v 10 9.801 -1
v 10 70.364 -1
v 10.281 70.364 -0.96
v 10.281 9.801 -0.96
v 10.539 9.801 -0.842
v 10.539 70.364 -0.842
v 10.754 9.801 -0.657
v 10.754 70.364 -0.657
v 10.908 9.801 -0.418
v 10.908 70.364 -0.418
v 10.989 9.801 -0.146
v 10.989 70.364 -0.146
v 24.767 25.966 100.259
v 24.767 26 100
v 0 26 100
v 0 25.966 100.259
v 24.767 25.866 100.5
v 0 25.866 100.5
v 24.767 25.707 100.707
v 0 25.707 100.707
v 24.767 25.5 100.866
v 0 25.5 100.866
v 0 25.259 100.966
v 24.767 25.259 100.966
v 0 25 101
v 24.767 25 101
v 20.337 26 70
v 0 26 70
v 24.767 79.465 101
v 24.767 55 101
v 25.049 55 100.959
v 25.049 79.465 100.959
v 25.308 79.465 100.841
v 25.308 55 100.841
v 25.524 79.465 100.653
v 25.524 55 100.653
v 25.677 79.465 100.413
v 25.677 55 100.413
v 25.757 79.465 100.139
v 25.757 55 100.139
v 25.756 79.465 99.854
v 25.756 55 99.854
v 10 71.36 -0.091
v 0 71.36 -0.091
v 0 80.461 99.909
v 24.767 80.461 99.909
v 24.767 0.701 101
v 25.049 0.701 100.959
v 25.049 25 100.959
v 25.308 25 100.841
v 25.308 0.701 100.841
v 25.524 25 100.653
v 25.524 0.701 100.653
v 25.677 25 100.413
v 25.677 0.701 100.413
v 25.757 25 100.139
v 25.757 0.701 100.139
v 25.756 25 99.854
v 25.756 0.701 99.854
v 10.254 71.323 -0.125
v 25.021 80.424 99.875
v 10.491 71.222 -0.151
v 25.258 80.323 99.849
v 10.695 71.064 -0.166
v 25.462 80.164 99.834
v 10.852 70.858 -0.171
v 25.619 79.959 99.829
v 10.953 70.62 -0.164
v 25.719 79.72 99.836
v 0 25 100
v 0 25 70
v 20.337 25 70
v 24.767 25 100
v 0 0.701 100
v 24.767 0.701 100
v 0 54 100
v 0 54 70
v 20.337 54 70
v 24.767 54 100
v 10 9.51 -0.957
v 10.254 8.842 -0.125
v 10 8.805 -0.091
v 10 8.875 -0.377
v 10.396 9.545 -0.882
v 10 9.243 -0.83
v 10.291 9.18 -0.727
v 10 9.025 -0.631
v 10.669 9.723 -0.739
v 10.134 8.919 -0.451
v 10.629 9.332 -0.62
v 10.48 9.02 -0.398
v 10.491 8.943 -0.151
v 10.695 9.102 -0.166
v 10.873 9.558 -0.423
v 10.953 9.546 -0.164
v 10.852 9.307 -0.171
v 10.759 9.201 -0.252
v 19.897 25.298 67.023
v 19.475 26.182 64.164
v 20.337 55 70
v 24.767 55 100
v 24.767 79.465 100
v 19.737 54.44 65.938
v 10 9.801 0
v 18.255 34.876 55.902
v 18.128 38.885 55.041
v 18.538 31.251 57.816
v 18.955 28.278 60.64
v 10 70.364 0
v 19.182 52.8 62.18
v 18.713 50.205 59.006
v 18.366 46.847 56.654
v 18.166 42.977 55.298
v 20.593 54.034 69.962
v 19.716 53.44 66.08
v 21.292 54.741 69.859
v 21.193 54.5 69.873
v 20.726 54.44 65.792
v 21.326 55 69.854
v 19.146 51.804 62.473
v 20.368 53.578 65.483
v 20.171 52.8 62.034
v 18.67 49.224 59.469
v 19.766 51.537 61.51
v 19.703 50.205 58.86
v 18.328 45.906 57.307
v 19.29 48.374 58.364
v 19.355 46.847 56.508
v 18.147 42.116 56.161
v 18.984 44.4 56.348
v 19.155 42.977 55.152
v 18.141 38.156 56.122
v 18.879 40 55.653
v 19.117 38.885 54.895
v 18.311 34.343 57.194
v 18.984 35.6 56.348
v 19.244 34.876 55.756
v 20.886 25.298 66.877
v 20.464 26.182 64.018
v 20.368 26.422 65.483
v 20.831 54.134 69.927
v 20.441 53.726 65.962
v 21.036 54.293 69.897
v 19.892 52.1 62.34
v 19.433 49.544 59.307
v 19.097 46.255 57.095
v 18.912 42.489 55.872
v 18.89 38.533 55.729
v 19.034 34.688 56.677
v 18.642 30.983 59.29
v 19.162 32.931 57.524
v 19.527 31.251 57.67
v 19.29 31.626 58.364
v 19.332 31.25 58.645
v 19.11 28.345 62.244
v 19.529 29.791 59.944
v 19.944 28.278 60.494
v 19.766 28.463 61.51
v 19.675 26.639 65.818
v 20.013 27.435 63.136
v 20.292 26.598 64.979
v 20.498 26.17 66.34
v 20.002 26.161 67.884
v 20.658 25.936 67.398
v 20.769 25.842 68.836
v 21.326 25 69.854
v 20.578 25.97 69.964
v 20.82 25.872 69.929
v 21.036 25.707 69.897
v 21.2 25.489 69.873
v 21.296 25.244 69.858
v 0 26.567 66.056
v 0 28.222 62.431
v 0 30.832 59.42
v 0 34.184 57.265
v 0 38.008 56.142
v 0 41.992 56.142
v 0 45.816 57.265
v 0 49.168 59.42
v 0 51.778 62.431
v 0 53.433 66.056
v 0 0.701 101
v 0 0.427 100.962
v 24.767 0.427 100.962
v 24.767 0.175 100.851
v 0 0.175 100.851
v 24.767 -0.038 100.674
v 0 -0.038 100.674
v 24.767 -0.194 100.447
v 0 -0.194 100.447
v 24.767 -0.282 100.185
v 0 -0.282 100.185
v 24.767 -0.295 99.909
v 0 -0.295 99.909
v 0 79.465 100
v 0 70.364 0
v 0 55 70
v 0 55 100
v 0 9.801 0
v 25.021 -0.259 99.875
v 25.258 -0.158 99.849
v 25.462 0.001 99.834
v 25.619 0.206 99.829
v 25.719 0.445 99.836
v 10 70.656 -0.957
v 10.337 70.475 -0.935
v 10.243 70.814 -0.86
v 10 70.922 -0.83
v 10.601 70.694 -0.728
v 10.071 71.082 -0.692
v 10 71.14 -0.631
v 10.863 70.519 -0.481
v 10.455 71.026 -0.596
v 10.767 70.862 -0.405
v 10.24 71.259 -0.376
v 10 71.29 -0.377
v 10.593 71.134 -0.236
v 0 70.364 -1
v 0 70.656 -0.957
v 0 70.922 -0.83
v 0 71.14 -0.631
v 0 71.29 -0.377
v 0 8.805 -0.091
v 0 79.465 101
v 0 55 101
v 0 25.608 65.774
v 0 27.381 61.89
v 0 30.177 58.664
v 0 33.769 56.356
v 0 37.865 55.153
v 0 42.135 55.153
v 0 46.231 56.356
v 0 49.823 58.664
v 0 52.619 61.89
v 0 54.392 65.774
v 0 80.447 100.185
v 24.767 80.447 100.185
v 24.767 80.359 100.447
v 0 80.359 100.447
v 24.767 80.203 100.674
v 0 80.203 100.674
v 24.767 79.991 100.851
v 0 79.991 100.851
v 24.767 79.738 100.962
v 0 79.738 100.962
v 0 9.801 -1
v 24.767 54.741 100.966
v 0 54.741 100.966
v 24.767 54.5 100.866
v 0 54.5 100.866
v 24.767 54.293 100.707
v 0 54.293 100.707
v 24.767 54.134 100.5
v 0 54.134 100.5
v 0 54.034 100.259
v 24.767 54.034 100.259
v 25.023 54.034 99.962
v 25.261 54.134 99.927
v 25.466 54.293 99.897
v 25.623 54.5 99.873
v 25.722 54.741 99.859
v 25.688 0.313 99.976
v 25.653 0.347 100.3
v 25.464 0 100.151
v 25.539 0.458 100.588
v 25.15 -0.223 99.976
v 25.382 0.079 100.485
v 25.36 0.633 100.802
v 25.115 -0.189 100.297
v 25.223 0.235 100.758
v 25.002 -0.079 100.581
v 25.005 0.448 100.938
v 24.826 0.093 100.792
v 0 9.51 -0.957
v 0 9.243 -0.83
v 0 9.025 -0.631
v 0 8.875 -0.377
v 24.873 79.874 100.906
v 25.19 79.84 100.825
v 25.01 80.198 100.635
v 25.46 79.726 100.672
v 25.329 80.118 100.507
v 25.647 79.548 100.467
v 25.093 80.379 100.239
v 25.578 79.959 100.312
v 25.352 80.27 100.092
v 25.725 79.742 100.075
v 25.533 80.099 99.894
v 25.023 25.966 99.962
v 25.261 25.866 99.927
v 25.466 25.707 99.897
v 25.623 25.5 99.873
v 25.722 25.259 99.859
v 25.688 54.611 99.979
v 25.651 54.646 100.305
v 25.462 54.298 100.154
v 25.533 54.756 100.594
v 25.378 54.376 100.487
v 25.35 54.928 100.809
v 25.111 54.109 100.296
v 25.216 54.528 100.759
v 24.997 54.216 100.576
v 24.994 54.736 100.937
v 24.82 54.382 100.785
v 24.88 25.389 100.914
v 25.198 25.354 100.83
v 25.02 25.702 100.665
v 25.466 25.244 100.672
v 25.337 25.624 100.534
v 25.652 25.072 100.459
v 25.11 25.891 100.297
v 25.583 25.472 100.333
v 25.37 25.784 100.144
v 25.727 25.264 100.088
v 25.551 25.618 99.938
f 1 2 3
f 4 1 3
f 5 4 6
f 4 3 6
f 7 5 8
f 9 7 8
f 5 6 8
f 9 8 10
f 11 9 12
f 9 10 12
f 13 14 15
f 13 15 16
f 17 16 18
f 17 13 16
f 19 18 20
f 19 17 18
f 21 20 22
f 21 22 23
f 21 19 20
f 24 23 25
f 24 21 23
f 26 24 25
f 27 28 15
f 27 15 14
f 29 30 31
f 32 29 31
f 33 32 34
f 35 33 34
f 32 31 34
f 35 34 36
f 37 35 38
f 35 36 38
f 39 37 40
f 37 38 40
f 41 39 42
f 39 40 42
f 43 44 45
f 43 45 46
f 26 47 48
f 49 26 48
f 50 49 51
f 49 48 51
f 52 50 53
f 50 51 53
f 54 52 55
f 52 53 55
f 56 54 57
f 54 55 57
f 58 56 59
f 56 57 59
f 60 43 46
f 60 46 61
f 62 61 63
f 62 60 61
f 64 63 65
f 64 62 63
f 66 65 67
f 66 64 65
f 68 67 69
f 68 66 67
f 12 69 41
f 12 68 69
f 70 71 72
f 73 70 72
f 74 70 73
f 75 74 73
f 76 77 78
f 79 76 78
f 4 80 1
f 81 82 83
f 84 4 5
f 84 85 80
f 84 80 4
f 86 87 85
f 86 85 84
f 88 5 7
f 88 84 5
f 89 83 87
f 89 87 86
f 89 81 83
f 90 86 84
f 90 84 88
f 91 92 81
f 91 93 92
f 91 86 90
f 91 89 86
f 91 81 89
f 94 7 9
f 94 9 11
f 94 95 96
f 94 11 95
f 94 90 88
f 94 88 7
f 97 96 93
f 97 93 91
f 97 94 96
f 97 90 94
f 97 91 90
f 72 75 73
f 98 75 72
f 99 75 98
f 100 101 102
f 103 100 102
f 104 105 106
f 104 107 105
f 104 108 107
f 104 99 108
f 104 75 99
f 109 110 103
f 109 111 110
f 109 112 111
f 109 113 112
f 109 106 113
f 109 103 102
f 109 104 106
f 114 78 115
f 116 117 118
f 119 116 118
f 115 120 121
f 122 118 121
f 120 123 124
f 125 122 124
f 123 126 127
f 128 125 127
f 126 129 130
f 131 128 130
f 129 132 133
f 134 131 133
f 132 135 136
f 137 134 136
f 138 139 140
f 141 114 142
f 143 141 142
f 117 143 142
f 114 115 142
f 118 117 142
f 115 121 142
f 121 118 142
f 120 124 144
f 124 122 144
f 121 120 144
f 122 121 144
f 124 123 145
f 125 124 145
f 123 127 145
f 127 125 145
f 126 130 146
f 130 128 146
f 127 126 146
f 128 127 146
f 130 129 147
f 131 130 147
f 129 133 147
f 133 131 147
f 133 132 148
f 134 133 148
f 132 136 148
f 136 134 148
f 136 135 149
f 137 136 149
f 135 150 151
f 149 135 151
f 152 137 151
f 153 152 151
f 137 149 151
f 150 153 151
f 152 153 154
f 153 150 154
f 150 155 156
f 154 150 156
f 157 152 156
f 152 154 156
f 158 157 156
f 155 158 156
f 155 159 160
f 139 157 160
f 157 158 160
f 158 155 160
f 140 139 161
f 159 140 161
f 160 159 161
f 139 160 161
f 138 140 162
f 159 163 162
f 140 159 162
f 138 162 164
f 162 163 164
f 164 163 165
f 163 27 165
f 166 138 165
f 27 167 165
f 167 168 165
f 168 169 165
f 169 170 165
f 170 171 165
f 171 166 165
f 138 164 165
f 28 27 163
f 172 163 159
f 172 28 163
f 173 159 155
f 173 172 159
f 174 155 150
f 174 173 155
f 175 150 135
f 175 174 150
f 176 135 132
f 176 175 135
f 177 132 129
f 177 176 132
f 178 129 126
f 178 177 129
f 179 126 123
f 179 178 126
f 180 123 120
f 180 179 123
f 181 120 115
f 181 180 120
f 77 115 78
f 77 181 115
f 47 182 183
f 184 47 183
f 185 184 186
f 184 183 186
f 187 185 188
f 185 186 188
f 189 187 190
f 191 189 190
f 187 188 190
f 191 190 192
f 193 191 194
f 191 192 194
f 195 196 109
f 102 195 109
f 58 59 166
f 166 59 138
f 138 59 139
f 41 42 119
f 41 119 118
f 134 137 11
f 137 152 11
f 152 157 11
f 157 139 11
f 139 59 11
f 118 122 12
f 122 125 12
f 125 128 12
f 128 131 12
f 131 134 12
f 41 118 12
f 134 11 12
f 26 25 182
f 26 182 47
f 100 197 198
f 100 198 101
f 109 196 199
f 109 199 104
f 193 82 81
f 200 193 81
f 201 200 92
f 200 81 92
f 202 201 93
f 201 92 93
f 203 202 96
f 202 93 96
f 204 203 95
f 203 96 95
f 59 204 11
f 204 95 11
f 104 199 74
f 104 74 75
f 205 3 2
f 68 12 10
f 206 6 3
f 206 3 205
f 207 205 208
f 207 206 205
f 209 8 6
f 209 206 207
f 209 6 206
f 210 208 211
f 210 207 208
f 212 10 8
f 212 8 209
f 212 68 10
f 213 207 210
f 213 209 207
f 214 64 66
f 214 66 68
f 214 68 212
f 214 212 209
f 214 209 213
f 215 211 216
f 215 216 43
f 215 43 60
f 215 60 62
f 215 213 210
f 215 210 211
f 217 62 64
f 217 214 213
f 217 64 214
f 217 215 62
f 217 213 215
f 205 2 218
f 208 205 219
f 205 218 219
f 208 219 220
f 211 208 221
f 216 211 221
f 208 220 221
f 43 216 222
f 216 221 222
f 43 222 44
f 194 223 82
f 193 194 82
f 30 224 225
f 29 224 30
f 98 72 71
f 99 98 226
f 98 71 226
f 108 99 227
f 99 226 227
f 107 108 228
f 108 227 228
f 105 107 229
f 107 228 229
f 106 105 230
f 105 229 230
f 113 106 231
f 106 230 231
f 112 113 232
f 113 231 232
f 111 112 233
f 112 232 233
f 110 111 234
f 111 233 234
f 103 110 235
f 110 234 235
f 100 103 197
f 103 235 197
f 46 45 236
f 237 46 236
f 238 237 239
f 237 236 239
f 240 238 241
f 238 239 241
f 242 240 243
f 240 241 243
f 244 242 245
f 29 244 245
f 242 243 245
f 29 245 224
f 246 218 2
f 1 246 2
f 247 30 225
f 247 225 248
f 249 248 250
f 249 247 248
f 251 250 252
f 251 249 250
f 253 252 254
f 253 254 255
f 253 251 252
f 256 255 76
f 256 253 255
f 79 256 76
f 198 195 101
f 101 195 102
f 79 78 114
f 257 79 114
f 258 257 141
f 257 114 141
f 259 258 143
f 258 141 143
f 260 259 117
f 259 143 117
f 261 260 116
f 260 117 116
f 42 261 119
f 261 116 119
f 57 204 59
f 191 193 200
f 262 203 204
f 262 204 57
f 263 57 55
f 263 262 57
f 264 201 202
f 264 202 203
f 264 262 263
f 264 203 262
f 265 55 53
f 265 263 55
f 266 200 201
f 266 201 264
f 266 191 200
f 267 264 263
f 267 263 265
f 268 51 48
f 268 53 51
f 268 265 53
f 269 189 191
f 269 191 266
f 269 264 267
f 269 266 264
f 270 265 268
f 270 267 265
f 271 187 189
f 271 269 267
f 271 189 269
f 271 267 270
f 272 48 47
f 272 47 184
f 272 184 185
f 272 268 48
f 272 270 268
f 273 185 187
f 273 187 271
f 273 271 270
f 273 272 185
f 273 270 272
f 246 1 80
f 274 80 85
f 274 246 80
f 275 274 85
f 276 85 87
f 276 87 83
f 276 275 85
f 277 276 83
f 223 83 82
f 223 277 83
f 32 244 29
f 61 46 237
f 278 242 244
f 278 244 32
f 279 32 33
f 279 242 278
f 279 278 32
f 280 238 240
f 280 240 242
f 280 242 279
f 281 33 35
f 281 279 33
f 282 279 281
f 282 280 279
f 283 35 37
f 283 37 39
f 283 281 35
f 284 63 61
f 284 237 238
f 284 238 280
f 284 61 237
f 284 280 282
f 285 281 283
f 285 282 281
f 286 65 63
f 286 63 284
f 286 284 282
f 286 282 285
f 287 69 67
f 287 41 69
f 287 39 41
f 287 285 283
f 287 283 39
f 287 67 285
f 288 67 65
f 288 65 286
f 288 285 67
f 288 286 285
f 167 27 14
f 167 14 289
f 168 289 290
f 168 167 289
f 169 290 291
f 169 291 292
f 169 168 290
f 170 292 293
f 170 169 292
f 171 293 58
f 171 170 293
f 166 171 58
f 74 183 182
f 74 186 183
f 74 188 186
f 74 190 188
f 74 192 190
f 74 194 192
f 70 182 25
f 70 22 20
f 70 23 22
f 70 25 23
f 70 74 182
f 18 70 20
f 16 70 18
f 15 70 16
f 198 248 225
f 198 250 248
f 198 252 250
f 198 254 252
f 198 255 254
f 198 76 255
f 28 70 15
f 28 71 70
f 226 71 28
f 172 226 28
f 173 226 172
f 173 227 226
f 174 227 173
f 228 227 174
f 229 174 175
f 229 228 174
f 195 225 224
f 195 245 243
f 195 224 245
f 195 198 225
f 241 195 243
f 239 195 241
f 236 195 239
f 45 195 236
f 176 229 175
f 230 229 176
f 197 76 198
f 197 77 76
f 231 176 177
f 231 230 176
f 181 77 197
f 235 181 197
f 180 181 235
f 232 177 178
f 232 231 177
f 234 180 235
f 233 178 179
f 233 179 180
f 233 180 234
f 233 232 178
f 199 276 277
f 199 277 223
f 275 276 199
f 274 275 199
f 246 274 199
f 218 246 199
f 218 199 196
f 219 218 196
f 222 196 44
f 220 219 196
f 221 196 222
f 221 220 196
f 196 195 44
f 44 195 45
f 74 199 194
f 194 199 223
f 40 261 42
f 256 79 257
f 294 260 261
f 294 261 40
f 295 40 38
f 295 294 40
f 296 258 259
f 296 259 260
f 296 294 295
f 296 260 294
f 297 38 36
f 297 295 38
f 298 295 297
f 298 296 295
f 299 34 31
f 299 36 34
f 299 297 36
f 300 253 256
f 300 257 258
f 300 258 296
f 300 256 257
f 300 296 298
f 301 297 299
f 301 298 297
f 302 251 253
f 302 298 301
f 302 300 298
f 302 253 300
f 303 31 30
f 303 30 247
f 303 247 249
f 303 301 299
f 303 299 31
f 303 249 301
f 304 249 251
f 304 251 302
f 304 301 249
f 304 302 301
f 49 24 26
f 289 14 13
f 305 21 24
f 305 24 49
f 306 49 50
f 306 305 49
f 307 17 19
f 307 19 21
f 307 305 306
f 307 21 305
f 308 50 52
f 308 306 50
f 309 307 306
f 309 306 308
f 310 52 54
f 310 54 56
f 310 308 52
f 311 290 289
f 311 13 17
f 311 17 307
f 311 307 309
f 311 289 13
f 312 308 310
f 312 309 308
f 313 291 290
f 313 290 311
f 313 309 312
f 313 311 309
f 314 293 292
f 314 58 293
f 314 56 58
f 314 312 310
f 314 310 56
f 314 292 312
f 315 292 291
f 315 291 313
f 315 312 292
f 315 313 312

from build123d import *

# Parameters (mm, degrees)
CYLINDER_R           = 15
CYLINDER_DEPTH       = 100
CYLINDER_PITCH_ANGLE = 90
BOX005_W             = 100
BOX005_H             = 30
BOX005_DEPTH         = 30
BOX004_W             = 40
BOX004_H             = 40
BOX004_DEPTH         = 120
BOX004_ROLL_ANGLE    = -5.2
BOX003_W             = 40
BOX003_H             = 40
BOX003_DEPTH         = 120
BOX003_ROLL_ANGLE    = 5.2
BOX001_W             = 19
BOX001_H             = 100
BOX001_DEPTH         = 110
BOX001_PITCH_ANGLE   = 8.4
BOX_W                = 25
BOX_H                = 80
BOX_DEPTH            = 100
THICKNESS_T          = 1


with BuildPart() as cylinder:
    # Cylinder → Cylinder (new body)
    with BuildSketch(Plane.XY):
        Circle(CYLINDER_R)
    extrude(amount=CYLINDER_DEPTH)


with BuildPart() as cylinder_1:
    # Cylinder pitch: moved
    add(cylinder.part.rotate(Axis((0, 0, 0), (0, 1, 0)), CYLINDER_PITCH_ANGLE))


with BuildPart() as cylinder_2:
    # Cylinder placement: moved
    add(cylinder_1.part.moved(Location((0, 40, 70))))


with BuildPart() as fusion:
    # Box005 → Box005 (new body)
    with BuildSketch(Plane(origin=(0, 25, 70), x_dir=(1, 0, 0), z_dir=(0, 0, 1))):
        with Locations((50, 15)):
            Rectangle(BOX005_W, BOX005_H)
    extrude(amount=BOX005_DEPTH)

    # Fusion: union Cylinder
    add(cylinder_2.part)


with BuildPart() as cube002:
    # Box004 → Box004 (new body)
    with BuildSketch(Plane.XY):
        with Locations((20, 20)):
            Rectangle(BOX004_W, BOX004_H)
    extrude(amount=BOX004_DEPTH)


with BuildPart() as cube002_1:
    # Box004 roll: moved
    add(cube002.part.rotate(Axis((0, 0, 0), (1, 0, 0)), BOX004_ROLL_ANGLE))


with BuildPart() as cube002_2:
    # Box004 placement: moved
    add(cube002_1.part.moved(Location((0, 70, -4))))


with BuildPart() as cube003:
    # Box003 → Box003 (new body)
    with BuildSketch(Plane.XY):
        with Locations((20, 20)):
            Rectangle(BOX003_W, BOX003_H)
    extrude(amount=BOX003_DEPTH)


with BuildPart() as cube003_1:
    # Box003 roll: moved
    add(cube003.part.rotate(Axis((0, 0, 0), (1, 0, 0)), BOX003_ROLL_ANGLE))


with BuildPart() as cube003_2:
    # Box003 placement: moved
    add(cube003_1.part.moved(Location((0, -30, -4))))


with BuildPart() as cube001:
    # Box001 → Box001 (new body)
    with BuildSketch(Plane.XY):
        with Locations((9.5, 50)):
            Rectangle(BOX001_W, BOX001_H)
    extrude(amount=BOX001_DEPTH)


with BuildPart() as cube001_1:
    # Box001 pitch: moved
    add(cube001.part.rotate(Axis((0, 0, 0), (0, 1, 0)), BOX001_PITCH_ANGLE))


with BuildPart() as cube001_2:
    # Box001 placement: moved
    add(cube001_1.part.moved(Location((10, 0, 0))))


with BuildPart() as thickness:
    # Box → Box (new body)
    with BuildSketch(Plane.XY):
        with Locations((12.5, 40)):
            Rectangle(BOX_W, BOX_H)
    extrude(amount=BOX_DEPTH)

    # Cut: cut Cube001
    add(cube001_2.part, mode=Mode.SUBTRACT)

    # Cut001: cut Cube003
    add(cube003_2.part, mode=Mode.SUBTRACT)

    # Cut002: cut Cube002
    add(cube002_2.part, mode=Mode.SUBTRACT)

    # Cut003: cut Fusion
    add(fusion.part, mode=Mode.SUBTRACT)

    # Thickness
    thickness_openings = [thickness.faces().sort_by_distance(p)[0] for p in [
        (0, 40.100786, 46.297736),
    ]]
    offset(amount=THICKNESS_T, openings=thickness_openings)


solid = thickness.part
